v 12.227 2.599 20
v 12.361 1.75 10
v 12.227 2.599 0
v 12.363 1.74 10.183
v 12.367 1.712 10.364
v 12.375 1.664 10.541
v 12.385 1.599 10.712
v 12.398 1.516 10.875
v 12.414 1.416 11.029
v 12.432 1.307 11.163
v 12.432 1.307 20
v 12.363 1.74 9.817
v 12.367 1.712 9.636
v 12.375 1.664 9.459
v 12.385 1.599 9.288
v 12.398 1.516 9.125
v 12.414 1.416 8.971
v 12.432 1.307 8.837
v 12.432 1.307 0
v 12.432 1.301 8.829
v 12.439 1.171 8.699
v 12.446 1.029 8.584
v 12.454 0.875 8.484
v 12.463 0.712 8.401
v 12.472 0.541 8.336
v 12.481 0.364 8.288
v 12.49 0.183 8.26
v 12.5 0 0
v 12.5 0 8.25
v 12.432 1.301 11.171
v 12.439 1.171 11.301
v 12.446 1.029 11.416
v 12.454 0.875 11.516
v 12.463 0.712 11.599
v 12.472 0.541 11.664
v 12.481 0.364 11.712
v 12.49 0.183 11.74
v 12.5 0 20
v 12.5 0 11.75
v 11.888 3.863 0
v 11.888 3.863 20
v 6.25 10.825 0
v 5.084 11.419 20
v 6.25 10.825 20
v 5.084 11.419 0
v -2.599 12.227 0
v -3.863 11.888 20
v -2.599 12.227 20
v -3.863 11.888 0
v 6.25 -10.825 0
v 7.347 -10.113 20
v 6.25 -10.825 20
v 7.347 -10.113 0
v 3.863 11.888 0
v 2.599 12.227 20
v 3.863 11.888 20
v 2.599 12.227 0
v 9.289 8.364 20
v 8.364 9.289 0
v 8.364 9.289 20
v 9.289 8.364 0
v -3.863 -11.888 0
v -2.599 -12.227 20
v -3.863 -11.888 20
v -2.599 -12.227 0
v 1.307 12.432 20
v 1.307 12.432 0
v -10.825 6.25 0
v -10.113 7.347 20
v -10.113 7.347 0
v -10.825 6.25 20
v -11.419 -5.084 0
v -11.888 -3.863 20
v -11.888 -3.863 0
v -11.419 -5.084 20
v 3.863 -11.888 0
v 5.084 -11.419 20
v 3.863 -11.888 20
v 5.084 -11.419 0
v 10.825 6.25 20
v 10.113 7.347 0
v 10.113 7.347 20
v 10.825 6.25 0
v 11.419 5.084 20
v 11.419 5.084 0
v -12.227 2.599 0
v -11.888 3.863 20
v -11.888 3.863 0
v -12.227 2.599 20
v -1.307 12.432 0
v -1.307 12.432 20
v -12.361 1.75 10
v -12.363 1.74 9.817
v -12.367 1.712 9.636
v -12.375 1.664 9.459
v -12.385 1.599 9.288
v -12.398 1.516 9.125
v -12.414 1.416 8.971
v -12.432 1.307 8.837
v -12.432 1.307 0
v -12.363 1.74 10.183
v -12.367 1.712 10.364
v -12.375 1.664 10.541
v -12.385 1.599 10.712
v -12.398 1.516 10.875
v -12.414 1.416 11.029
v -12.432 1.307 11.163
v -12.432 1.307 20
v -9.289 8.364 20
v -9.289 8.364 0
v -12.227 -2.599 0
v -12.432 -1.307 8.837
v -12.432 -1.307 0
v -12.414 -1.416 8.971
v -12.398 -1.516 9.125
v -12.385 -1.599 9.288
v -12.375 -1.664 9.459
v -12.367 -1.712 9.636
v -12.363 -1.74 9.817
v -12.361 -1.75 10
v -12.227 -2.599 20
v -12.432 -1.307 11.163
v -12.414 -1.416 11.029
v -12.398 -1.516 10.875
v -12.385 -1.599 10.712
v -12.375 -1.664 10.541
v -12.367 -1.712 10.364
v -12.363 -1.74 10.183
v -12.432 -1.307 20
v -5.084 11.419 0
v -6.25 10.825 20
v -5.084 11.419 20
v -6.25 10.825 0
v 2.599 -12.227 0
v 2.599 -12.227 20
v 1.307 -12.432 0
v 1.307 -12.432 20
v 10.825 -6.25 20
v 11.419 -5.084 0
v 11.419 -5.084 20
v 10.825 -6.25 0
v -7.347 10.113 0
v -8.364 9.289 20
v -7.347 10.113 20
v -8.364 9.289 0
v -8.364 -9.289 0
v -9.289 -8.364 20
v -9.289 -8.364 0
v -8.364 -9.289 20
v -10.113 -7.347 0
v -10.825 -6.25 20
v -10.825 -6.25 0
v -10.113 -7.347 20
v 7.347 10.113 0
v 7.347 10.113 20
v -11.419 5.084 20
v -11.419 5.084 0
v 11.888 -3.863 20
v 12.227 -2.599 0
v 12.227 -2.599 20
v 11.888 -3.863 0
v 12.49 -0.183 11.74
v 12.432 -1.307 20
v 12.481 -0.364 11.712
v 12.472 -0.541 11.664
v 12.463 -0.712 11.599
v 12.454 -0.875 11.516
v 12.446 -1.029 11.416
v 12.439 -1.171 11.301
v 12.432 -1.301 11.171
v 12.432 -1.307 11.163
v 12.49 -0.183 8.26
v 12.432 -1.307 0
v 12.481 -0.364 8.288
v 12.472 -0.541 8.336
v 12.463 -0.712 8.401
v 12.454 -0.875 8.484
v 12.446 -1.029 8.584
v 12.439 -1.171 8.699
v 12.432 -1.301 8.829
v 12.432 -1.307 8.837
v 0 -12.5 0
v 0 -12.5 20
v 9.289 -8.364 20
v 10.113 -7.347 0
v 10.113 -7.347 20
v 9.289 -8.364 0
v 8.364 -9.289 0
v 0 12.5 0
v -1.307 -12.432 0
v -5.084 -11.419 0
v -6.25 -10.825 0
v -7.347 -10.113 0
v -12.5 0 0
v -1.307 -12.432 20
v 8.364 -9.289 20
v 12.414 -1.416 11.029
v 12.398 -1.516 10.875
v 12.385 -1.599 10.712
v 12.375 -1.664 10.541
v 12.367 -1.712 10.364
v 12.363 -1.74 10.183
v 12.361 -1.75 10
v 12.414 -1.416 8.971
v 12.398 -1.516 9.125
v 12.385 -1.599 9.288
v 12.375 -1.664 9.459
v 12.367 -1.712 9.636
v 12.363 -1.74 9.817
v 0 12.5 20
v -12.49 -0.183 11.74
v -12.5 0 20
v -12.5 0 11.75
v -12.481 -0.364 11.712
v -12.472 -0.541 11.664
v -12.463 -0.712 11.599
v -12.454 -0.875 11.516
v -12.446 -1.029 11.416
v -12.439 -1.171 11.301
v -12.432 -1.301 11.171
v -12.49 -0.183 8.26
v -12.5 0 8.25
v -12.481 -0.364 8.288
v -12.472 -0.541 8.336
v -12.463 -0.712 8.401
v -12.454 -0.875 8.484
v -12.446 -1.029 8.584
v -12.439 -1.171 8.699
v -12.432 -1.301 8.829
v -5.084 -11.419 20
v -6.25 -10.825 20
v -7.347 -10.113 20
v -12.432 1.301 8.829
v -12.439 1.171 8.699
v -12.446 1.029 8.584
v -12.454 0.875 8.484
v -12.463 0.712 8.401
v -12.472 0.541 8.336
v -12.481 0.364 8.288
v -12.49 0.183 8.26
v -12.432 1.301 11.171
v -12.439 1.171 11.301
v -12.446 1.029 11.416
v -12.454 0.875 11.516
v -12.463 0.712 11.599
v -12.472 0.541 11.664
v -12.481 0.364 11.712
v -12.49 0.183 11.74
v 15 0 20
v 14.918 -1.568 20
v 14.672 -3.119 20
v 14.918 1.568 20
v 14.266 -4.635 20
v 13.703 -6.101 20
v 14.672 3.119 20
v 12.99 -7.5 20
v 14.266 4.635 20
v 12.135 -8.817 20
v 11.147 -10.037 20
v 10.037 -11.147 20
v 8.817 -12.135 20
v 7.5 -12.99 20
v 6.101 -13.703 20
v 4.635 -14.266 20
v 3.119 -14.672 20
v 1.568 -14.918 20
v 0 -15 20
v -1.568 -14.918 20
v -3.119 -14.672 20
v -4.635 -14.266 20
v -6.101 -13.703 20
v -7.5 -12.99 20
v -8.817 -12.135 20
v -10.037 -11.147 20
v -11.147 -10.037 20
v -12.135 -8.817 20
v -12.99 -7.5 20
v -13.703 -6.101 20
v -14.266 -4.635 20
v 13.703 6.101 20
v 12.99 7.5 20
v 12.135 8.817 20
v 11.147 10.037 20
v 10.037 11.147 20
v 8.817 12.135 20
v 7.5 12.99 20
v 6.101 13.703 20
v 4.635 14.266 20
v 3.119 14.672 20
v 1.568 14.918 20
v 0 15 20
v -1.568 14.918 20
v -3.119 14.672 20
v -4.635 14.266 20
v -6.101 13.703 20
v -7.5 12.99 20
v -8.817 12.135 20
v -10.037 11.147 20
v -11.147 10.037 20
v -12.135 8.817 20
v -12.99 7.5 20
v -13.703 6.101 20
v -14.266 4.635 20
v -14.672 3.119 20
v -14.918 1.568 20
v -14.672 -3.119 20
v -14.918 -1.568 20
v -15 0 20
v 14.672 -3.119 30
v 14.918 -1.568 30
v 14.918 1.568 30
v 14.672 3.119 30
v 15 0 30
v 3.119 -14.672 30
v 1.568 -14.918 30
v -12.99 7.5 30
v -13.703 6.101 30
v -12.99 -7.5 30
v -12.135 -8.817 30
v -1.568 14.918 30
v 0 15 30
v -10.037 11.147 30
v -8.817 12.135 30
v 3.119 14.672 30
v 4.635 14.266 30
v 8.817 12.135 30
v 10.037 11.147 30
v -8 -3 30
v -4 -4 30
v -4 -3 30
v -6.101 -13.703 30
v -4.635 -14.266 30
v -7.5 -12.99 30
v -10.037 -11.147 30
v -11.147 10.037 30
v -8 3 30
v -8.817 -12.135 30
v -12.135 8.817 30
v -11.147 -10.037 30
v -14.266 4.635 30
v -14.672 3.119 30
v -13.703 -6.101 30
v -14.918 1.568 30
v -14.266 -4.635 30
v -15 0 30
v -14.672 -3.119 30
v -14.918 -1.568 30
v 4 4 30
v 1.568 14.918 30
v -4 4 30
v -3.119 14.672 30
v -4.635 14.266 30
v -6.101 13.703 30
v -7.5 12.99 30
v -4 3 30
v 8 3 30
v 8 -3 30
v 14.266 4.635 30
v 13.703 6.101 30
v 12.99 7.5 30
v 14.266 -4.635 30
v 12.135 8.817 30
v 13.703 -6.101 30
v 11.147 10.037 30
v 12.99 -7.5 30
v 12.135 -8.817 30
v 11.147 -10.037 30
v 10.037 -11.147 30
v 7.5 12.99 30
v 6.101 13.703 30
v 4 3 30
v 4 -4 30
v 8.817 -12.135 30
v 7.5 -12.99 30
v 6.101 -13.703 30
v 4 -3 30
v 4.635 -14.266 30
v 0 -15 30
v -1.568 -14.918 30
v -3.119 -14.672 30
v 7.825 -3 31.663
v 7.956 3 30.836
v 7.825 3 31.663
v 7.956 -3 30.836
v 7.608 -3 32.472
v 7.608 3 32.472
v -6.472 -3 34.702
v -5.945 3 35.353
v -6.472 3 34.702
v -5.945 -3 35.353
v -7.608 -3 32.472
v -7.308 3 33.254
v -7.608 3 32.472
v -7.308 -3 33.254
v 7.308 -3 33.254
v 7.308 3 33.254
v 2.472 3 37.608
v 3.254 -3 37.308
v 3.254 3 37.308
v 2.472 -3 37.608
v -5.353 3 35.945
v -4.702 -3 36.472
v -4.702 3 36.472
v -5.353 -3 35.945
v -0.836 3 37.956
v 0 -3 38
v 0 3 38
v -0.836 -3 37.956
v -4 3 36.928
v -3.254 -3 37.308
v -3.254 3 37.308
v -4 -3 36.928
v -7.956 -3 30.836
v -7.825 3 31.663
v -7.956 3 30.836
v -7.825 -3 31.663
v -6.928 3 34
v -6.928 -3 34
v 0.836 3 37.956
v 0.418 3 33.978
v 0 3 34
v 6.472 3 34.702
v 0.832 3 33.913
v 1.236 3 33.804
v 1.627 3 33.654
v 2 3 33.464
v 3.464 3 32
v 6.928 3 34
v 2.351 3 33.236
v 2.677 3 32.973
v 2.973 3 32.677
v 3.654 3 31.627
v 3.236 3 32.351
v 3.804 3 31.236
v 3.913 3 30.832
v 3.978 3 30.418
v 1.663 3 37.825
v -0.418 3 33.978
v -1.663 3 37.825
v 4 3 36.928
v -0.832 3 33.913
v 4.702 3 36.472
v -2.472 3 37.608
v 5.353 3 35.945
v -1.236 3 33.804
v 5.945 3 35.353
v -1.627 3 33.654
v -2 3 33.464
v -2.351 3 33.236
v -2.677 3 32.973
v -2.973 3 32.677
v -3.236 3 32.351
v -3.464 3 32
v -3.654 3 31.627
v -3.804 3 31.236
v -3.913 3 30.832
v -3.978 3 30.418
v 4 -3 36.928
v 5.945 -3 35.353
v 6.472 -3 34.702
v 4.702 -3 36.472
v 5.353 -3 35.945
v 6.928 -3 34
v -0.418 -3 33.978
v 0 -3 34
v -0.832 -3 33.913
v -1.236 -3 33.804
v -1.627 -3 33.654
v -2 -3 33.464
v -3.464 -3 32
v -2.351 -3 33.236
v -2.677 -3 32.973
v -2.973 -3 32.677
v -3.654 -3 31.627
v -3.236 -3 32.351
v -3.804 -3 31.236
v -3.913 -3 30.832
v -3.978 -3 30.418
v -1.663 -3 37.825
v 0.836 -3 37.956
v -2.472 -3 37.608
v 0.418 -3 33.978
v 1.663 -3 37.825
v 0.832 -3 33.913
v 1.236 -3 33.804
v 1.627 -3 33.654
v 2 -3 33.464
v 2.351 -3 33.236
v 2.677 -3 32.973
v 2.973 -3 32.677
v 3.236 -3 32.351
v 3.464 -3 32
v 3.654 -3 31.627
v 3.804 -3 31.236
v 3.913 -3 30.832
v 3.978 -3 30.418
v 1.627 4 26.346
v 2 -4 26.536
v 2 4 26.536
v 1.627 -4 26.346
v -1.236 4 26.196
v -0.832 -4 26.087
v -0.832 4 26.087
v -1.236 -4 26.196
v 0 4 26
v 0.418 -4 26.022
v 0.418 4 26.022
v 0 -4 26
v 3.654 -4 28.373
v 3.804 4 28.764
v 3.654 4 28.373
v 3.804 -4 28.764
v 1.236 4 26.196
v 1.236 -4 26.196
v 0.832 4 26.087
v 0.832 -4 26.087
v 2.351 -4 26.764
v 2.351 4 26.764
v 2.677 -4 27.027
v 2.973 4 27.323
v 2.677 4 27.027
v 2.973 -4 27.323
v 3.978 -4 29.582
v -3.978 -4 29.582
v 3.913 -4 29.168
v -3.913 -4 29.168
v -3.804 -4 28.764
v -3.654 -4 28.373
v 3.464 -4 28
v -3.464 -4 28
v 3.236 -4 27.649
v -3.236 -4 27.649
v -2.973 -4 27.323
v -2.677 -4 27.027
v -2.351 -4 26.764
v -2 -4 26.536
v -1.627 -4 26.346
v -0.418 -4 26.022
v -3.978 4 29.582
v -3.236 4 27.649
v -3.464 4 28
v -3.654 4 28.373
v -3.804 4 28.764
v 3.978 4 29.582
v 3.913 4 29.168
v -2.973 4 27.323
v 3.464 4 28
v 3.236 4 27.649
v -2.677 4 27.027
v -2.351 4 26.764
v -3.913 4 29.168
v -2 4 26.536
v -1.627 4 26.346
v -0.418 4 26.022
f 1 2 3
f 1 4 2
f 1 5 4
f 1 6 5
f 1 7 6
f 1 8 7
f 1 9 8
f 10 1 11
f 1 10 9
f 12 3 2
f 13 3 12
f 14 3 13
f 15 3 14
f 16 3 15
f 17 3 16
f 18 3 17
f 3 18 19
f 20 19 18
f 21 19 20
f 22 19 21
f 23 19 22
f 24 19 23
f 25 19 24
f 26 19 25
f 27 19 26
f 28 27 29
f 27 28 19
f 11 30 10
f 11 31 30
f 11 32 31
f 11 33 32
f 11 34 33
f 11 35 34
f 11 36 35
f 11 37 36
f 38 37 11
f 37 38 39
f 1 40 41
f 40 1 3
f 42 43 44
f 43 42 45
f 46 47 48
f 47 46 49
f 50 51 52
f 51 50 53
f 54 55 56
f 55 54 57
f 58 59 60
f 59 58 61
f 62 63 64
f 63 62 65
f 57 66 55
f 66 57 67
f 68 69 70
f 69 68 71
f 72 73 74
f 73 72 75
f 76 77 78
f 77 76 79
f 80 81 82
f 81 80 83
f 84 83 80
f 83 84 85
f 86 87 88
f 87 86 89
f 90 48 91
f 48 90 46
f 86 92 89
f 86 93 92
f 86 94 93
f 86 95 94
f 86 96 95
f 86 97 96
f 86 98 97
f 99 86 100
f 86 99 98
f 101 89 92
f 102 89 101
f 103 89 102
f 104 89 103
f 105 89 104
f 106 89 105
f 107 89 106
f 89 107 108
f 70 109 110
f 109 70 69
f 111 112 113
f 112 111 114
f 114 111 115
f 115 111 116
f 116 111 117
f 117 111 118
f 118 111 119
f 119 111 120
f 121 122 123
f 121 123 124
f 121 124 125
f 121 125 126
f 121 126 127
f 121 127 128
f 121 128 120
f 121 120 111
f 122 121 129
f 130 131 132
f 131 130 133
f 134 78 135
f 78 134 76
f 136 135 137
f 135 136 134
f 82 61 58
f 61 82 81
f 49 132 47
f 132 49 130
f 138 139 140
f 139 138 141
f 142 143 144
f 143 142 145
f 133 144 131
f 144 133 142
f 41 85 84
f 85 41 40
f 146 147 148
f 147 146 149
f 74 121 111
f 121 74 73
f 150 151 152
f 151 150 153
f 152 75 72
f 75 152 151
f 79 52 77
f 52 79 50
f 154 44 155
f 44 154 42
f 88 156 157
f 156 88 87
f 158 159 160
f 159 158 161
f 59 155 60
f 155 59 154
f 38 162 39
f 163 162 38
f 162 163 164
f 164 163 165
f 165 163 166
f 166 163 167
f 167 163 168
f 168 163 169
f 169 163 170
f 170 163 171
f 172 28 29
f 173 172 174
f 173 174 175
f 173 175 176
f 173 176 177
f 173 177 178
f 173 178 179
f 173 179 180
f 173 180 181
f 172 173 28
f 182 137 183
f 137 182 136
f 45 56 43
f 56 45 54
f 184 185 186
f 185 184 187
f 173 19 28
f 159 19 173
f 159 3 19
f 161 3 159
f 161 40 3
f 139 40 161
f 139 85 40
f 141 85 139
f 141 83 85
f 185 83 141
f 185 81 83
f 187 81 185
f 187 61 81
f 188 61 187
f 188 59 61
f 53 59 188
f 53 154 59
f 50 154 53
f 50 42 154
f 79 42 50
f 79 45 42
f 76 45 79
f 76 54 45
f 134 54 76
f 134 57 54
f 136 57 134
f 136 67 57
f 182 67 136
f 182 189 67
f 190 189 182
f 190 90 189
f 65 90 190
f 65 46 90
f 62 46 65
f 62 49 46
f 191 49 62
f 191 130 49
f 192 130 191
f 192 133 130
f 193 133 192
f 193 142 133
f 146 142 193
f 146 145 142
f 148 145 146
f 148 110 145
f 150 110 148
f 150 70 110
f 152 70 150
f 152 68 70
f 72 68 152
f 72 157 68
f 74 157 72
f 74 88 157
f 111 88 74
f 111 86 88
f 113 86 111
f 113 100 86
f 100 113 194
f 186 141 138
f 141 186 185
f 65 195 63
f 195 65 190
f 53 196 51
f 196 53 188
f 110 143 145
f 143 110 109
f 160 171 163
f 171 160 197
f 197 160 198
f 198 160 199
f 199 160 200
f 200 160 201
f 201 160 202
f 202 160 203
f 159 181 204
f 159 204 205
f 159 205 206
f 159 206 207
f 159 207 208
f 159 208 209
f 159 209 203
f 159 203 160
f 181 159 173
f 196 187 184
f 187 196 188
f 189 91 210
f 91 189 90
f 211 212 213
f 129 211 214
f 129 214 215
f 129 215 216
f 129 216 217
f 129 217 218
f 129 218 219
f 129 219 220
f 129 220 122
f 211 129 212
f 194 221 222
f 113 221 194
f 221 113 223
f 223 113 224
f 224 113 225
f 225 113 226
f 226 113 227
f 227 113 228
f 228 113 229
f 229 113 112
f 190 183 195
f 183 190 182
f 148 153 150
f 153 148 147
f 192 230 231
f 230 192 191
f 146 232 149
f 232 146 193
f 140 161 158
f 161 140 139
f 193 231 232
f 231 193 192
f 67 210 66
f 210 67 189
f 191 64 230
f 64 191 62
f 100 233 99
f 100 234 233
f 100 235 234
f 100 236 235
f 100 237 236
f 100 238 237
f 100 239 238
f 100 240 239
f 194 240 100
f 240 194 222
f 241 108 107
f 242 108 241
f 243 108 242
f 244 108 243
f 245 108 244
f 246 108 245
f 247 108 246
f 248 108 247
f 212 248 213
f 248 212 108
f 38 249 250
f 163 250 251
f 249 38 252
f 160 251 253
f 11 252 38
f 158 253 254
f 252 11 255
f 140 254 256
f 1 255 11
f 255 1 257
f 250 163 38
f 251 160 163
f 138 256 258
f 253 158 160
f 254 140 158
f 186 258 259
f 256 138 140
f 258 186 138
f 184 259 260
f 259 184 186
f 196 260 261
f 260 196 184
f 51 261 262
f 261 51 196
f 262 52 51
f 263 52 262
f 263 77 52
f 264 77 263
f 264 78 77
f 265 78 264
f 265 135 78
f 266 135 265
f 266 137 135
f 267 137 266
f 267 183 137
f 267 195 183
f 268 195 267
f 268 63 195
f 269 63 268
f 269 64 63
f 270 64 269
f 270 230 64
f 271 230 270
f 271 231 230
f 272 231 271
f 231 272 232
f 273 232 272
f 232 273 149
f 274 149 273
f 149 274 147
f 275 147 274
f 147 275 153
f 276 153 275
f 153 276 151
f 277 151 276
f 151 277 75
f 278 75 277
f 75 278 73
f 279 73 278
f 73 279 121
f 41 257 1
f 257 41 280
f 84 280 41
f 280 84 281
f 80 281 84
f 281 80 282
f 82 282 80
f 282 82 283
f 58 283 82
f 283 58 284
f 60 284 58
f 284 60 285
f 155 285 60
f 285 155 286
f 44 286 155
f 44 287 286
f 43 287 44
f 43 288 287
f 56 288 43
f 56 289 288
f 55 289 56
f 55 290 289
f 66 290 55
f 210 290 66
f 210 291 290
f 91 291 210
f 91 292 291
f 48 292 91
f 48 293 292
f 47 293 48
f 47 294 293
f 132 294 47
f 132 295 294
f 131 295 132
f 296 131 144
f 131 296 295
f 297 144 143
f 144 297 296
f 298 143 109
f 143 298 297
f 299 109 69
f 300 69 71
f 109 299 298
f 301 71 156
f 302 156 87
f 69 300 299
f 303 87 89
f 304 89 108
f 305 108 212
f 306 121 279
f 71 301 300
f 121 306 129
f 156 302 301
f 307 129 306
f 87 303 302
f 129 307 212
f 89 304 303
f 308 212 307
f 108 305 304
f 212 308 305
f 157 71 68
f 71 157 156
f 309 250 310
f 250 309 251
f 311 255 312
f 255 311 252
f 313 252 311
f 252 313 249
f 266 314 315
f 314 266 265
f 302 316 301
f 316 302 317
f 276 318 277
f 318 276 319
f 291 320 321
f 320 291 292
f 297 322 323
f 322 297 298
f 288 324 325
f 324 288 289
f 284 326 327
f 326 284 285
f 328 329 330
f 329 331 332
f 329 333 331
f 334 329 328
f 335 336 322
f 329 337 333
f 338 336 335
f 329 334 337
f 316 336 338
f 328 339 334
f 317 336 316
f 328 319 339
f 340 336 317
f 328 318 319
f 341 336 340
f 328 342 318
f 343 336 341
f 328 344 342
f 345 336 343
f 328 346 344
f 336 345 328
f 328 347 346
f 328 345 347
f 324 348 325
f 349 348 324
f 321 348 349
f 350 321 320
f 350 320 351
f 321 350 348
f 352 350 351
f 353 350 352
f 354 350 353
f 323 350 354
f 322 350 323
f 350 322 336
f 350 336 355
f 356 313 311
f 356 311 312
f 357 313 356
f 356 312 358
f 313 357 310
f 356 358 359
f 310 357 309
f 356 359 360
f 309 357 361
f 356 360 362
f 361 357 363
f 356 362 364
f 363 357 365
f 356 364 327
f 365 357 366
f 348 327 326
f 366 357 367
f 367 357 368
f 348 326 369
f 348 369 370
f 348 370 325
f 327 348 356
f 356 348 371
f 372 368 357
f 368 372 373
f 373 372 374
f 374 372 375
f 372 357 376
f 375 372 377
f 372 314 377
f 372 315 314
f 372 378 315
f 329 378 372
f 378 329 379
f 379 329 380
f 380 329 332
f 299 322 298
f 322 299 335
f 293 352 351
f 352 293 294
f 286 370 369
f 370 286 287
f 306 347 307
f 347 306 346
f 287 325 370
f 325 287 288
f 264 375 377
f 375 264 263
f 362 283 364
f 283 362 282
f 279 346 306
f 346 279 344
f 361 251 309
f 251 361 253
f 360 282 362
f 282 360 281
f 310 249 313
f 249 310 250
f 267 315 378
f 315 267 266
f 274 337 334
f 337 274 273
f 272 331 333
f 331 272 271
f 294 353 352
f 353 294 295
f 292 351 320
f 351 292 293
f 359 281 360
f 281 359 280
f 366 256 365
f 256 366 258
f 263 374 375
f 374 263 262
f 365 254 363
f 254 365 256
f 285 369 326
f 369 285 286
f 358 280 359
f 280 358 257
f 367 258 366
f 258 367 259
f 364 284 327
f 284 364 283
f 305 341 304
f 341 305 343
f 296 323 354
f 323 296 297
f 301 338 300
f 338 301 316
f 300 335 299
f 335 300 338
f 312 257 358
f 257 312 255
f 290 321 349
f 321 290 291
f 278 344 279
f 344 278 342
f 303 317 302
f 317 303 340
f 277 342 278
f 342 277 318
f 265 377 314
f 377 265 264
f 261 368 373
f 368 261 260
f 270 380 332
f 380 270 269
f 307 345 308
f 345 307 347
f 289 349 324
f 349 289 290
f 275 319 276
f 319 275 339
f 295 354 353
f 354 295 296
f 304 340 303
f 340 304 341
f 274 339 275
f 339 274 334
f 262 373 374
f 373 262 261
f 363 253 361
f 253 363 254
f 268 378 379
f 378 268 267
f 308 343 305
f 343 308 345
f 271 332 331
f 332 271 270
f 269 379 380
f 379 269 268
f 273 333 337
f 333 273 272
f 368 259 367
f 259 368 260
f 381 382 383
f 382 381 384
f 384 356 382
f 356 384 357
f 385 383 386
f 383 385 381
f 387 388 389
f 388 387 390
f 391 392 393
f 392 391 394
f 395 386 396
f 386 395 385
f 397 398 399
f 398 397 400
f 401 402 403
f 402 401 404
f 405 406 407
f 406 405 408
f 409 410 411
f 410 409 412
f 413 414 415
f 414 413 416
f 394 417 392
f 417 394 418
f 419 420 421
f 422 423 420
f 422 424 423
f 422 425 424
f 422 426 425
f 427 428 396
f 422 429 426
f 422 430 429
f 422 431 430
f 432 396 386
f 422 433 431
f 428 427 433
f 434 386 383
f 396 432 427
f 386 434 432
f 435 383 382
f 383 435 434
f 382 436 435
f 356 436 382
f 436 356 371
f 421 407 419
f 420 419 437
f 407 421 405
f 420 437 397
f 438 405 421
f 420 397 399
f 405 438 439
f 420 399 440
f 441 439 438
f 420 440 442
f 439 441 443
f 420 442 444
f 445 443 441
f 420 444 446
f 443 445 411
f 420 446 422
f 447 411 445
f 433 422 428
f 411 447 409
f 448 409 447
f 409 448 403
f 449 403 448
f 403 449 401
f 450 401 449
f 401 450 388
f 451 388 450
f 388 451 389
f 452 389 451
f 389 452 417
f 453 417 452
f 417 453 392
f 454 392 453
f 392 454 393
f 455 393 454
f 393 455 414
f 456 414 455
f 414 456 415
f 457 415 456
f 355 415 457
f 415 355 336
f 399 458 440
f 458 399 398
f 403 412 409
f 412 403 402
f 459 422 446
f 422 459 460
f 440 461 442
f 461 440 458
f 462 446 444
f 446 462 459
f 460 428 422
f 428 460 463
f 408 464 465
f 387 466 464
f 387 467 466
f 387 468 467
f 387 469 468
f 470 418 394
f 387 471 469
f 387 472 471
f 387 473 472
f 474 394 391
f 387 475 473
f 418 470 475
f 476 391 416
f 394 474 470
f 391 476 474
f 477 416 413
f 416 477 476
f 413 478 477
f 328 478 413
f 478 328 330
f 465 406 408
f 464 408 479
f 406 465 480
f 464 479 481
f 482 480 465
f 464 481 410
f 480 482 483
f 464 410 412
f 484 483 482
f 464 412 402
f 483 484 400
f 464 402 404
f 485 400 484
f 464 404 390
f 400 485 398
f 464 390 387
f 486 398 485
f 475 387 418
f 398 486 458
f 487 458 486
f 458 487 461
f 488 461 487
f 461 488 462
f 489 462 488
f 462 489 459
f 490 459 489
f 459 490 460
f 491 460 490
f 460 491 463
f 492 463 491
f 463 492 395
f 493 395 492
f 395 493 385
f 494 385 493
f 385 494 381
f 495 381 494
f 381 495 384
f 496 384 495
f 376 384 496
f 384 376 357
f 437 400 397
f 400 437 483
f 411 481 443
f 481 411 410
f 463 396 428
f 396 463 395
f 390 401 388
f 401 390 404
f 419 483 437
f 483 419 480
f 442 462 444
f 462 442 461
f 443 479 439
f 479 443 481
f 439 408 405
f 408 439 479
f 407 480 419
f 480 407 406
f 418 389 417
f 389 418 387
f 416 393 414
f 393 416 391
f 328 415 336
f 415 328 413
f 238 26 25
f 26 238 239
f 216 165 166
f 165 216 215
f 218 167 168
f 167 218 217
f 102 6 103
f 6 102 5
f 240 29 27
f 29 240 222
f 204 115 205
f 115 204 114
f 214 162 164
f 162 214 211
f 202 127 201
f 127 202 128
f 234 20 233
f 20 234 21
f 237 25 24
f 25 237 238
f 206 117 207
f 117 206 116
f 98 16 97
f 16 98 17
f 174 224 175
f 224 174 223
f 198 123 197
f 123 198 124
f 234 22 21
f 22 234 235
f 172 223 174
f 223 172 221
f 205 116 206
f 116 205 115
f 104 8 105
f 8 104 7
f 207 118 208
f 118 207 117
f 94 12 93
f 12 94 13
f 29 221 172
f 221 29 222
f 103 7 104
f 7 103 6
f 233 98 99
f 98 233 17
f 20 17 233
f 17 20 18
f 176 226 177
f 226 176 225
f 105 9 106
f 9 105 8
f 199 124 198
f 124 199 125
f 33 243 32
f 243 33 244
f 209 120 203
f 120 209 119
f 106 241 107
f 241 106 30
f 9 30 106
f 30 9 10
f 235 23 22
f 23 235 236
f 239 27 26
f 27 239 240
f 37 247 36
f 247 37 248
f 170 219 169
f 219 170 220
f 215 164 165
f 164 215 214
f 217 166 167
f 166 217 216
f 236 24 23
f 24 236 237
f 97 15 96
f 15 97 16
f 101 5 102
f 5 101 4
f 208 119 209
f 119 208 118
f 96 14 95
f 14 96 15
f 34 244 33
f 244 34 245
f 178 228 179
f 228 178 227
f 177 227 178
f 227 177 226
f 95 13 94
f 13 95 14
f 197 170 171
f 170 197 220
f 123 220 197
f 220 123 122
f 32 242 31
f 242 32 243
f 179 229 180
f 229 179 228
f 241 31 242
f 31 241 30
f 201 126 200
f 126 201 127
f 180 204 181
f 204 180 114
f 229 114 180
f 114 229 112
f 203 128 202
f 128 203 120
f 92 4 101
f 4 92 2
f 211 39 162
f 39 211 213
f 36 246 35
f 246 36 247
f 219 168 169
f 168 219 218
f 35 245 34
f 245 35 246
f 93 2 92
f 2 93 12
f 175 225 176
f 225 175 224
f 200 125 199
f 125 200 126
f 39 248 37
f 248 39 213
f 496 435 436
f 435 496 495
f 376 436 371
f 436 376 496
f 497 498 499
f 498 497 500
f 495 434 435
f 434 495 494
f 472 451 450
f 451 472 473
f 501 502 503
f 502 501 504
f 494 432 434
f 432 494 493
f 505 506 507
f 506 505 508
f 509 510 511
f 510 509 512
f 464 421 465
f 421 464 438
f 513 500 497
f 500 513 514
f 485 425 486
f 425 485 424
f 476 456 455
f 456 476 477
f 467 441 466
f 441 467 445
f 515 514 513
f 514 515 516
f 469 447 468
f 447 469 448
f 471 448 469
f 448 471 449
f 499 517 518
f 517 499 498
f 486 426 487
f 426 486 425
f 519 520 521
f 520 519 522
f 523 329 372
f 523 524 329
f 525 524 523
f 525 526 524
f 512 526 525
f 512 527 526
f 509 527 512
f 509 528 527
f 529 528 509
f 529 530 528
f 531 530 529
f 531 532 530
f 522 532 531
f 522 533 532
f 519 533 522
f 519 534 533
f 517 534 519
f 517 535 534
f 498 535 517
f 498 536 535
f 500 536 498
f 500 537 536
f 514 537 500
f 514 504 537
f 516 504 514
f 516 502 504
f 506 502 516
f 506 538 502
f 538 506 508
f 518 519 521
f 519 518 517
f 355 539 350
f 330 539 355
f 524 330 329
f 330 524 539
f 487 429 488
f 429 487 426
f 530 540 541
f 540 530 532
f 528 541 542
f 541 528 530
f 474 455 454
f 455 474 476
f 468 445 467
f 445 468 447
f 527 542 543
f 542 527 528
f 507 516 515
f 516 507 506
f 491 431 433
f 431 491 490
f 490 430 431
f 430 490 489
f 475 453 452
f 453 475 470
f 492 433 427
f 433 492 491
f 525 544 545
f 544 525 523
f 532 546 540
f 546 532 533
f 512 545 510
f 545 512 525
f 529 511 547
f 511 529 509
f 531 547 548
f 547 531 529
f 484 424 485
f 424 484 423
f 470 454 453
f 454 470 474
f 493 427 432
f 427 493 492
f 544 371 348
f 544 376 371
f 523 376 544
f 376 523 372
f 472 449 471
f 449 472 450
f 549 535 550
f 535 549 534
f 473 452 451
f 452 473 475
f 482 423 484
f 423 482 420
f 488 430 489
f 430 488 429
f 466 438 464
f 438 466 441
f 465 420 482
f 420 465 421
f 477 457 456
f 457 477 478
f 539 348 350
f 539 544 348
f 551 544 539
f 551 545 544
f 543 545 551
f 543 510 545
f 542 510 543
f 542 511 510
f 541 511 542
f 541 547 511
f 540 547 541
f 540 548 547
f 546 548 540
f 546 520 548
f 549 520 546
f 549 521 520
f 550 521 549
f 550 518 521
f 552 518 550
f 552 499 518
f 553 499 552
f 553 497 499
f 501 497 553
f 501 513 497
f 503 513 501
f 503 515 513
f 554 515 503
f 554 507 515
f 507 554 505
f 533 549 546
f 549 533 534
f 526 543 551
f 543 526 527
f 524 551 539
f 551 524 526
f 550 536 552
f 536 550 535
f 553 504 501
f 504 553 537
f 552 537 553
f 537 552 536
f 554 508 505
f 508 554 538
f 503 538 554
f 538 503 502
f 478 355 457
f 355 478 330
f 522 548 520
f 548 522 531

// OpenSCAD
// OpenSCAD script for Pool Nunchuck Chain Attachment

module nunChuckChainAttachment(
    outer_diameter = 30,
    plug_diameter = 25,
    plug_length = 20,
    cap_height = 10,
    eyelet_outer_radius = 8,
    eyelet_inner_radius = 4,
    wall_thickness = 3,
    screw_hole_diameter = 3.5,
    $fn = 60
) {
    difference() {
        union() {
            // Plug portion (fits into nunchuck handle core)
            cylinder(d = plug_diameter, h = plug_length);

            // Cap rim collar
            translate([0, 0, plug_length])
                cylinder(d = outer_diameter, h = cap_height);

            // Top eyelet loop for chain or rope attachment
            translate([0, 0, plug_length + cap_height])
                rotate([90, 0, 0])
                    cylinder(r = eyelet_outer_radius, h = wall_thickness * 2, center = true);
        }

        // Cross-screw hole to secure attachment to handle
        translate([0, 0, plug_length / 2])
            rotate([0, 90, 0])
                cylinder(d = screw_hole_diameter, h = outer_diameter + 10, center = true);

        // Chain loop hole
        translate([0, 0, plug_length + cap_height])
            rotate([90, 0, 0])
                cylinder(r = eyelet_inner_radius, h = wall_thickness * 2 + 2, center = true);
    }
}

// Instantiation for preview
nunChuckChainAttachment();
